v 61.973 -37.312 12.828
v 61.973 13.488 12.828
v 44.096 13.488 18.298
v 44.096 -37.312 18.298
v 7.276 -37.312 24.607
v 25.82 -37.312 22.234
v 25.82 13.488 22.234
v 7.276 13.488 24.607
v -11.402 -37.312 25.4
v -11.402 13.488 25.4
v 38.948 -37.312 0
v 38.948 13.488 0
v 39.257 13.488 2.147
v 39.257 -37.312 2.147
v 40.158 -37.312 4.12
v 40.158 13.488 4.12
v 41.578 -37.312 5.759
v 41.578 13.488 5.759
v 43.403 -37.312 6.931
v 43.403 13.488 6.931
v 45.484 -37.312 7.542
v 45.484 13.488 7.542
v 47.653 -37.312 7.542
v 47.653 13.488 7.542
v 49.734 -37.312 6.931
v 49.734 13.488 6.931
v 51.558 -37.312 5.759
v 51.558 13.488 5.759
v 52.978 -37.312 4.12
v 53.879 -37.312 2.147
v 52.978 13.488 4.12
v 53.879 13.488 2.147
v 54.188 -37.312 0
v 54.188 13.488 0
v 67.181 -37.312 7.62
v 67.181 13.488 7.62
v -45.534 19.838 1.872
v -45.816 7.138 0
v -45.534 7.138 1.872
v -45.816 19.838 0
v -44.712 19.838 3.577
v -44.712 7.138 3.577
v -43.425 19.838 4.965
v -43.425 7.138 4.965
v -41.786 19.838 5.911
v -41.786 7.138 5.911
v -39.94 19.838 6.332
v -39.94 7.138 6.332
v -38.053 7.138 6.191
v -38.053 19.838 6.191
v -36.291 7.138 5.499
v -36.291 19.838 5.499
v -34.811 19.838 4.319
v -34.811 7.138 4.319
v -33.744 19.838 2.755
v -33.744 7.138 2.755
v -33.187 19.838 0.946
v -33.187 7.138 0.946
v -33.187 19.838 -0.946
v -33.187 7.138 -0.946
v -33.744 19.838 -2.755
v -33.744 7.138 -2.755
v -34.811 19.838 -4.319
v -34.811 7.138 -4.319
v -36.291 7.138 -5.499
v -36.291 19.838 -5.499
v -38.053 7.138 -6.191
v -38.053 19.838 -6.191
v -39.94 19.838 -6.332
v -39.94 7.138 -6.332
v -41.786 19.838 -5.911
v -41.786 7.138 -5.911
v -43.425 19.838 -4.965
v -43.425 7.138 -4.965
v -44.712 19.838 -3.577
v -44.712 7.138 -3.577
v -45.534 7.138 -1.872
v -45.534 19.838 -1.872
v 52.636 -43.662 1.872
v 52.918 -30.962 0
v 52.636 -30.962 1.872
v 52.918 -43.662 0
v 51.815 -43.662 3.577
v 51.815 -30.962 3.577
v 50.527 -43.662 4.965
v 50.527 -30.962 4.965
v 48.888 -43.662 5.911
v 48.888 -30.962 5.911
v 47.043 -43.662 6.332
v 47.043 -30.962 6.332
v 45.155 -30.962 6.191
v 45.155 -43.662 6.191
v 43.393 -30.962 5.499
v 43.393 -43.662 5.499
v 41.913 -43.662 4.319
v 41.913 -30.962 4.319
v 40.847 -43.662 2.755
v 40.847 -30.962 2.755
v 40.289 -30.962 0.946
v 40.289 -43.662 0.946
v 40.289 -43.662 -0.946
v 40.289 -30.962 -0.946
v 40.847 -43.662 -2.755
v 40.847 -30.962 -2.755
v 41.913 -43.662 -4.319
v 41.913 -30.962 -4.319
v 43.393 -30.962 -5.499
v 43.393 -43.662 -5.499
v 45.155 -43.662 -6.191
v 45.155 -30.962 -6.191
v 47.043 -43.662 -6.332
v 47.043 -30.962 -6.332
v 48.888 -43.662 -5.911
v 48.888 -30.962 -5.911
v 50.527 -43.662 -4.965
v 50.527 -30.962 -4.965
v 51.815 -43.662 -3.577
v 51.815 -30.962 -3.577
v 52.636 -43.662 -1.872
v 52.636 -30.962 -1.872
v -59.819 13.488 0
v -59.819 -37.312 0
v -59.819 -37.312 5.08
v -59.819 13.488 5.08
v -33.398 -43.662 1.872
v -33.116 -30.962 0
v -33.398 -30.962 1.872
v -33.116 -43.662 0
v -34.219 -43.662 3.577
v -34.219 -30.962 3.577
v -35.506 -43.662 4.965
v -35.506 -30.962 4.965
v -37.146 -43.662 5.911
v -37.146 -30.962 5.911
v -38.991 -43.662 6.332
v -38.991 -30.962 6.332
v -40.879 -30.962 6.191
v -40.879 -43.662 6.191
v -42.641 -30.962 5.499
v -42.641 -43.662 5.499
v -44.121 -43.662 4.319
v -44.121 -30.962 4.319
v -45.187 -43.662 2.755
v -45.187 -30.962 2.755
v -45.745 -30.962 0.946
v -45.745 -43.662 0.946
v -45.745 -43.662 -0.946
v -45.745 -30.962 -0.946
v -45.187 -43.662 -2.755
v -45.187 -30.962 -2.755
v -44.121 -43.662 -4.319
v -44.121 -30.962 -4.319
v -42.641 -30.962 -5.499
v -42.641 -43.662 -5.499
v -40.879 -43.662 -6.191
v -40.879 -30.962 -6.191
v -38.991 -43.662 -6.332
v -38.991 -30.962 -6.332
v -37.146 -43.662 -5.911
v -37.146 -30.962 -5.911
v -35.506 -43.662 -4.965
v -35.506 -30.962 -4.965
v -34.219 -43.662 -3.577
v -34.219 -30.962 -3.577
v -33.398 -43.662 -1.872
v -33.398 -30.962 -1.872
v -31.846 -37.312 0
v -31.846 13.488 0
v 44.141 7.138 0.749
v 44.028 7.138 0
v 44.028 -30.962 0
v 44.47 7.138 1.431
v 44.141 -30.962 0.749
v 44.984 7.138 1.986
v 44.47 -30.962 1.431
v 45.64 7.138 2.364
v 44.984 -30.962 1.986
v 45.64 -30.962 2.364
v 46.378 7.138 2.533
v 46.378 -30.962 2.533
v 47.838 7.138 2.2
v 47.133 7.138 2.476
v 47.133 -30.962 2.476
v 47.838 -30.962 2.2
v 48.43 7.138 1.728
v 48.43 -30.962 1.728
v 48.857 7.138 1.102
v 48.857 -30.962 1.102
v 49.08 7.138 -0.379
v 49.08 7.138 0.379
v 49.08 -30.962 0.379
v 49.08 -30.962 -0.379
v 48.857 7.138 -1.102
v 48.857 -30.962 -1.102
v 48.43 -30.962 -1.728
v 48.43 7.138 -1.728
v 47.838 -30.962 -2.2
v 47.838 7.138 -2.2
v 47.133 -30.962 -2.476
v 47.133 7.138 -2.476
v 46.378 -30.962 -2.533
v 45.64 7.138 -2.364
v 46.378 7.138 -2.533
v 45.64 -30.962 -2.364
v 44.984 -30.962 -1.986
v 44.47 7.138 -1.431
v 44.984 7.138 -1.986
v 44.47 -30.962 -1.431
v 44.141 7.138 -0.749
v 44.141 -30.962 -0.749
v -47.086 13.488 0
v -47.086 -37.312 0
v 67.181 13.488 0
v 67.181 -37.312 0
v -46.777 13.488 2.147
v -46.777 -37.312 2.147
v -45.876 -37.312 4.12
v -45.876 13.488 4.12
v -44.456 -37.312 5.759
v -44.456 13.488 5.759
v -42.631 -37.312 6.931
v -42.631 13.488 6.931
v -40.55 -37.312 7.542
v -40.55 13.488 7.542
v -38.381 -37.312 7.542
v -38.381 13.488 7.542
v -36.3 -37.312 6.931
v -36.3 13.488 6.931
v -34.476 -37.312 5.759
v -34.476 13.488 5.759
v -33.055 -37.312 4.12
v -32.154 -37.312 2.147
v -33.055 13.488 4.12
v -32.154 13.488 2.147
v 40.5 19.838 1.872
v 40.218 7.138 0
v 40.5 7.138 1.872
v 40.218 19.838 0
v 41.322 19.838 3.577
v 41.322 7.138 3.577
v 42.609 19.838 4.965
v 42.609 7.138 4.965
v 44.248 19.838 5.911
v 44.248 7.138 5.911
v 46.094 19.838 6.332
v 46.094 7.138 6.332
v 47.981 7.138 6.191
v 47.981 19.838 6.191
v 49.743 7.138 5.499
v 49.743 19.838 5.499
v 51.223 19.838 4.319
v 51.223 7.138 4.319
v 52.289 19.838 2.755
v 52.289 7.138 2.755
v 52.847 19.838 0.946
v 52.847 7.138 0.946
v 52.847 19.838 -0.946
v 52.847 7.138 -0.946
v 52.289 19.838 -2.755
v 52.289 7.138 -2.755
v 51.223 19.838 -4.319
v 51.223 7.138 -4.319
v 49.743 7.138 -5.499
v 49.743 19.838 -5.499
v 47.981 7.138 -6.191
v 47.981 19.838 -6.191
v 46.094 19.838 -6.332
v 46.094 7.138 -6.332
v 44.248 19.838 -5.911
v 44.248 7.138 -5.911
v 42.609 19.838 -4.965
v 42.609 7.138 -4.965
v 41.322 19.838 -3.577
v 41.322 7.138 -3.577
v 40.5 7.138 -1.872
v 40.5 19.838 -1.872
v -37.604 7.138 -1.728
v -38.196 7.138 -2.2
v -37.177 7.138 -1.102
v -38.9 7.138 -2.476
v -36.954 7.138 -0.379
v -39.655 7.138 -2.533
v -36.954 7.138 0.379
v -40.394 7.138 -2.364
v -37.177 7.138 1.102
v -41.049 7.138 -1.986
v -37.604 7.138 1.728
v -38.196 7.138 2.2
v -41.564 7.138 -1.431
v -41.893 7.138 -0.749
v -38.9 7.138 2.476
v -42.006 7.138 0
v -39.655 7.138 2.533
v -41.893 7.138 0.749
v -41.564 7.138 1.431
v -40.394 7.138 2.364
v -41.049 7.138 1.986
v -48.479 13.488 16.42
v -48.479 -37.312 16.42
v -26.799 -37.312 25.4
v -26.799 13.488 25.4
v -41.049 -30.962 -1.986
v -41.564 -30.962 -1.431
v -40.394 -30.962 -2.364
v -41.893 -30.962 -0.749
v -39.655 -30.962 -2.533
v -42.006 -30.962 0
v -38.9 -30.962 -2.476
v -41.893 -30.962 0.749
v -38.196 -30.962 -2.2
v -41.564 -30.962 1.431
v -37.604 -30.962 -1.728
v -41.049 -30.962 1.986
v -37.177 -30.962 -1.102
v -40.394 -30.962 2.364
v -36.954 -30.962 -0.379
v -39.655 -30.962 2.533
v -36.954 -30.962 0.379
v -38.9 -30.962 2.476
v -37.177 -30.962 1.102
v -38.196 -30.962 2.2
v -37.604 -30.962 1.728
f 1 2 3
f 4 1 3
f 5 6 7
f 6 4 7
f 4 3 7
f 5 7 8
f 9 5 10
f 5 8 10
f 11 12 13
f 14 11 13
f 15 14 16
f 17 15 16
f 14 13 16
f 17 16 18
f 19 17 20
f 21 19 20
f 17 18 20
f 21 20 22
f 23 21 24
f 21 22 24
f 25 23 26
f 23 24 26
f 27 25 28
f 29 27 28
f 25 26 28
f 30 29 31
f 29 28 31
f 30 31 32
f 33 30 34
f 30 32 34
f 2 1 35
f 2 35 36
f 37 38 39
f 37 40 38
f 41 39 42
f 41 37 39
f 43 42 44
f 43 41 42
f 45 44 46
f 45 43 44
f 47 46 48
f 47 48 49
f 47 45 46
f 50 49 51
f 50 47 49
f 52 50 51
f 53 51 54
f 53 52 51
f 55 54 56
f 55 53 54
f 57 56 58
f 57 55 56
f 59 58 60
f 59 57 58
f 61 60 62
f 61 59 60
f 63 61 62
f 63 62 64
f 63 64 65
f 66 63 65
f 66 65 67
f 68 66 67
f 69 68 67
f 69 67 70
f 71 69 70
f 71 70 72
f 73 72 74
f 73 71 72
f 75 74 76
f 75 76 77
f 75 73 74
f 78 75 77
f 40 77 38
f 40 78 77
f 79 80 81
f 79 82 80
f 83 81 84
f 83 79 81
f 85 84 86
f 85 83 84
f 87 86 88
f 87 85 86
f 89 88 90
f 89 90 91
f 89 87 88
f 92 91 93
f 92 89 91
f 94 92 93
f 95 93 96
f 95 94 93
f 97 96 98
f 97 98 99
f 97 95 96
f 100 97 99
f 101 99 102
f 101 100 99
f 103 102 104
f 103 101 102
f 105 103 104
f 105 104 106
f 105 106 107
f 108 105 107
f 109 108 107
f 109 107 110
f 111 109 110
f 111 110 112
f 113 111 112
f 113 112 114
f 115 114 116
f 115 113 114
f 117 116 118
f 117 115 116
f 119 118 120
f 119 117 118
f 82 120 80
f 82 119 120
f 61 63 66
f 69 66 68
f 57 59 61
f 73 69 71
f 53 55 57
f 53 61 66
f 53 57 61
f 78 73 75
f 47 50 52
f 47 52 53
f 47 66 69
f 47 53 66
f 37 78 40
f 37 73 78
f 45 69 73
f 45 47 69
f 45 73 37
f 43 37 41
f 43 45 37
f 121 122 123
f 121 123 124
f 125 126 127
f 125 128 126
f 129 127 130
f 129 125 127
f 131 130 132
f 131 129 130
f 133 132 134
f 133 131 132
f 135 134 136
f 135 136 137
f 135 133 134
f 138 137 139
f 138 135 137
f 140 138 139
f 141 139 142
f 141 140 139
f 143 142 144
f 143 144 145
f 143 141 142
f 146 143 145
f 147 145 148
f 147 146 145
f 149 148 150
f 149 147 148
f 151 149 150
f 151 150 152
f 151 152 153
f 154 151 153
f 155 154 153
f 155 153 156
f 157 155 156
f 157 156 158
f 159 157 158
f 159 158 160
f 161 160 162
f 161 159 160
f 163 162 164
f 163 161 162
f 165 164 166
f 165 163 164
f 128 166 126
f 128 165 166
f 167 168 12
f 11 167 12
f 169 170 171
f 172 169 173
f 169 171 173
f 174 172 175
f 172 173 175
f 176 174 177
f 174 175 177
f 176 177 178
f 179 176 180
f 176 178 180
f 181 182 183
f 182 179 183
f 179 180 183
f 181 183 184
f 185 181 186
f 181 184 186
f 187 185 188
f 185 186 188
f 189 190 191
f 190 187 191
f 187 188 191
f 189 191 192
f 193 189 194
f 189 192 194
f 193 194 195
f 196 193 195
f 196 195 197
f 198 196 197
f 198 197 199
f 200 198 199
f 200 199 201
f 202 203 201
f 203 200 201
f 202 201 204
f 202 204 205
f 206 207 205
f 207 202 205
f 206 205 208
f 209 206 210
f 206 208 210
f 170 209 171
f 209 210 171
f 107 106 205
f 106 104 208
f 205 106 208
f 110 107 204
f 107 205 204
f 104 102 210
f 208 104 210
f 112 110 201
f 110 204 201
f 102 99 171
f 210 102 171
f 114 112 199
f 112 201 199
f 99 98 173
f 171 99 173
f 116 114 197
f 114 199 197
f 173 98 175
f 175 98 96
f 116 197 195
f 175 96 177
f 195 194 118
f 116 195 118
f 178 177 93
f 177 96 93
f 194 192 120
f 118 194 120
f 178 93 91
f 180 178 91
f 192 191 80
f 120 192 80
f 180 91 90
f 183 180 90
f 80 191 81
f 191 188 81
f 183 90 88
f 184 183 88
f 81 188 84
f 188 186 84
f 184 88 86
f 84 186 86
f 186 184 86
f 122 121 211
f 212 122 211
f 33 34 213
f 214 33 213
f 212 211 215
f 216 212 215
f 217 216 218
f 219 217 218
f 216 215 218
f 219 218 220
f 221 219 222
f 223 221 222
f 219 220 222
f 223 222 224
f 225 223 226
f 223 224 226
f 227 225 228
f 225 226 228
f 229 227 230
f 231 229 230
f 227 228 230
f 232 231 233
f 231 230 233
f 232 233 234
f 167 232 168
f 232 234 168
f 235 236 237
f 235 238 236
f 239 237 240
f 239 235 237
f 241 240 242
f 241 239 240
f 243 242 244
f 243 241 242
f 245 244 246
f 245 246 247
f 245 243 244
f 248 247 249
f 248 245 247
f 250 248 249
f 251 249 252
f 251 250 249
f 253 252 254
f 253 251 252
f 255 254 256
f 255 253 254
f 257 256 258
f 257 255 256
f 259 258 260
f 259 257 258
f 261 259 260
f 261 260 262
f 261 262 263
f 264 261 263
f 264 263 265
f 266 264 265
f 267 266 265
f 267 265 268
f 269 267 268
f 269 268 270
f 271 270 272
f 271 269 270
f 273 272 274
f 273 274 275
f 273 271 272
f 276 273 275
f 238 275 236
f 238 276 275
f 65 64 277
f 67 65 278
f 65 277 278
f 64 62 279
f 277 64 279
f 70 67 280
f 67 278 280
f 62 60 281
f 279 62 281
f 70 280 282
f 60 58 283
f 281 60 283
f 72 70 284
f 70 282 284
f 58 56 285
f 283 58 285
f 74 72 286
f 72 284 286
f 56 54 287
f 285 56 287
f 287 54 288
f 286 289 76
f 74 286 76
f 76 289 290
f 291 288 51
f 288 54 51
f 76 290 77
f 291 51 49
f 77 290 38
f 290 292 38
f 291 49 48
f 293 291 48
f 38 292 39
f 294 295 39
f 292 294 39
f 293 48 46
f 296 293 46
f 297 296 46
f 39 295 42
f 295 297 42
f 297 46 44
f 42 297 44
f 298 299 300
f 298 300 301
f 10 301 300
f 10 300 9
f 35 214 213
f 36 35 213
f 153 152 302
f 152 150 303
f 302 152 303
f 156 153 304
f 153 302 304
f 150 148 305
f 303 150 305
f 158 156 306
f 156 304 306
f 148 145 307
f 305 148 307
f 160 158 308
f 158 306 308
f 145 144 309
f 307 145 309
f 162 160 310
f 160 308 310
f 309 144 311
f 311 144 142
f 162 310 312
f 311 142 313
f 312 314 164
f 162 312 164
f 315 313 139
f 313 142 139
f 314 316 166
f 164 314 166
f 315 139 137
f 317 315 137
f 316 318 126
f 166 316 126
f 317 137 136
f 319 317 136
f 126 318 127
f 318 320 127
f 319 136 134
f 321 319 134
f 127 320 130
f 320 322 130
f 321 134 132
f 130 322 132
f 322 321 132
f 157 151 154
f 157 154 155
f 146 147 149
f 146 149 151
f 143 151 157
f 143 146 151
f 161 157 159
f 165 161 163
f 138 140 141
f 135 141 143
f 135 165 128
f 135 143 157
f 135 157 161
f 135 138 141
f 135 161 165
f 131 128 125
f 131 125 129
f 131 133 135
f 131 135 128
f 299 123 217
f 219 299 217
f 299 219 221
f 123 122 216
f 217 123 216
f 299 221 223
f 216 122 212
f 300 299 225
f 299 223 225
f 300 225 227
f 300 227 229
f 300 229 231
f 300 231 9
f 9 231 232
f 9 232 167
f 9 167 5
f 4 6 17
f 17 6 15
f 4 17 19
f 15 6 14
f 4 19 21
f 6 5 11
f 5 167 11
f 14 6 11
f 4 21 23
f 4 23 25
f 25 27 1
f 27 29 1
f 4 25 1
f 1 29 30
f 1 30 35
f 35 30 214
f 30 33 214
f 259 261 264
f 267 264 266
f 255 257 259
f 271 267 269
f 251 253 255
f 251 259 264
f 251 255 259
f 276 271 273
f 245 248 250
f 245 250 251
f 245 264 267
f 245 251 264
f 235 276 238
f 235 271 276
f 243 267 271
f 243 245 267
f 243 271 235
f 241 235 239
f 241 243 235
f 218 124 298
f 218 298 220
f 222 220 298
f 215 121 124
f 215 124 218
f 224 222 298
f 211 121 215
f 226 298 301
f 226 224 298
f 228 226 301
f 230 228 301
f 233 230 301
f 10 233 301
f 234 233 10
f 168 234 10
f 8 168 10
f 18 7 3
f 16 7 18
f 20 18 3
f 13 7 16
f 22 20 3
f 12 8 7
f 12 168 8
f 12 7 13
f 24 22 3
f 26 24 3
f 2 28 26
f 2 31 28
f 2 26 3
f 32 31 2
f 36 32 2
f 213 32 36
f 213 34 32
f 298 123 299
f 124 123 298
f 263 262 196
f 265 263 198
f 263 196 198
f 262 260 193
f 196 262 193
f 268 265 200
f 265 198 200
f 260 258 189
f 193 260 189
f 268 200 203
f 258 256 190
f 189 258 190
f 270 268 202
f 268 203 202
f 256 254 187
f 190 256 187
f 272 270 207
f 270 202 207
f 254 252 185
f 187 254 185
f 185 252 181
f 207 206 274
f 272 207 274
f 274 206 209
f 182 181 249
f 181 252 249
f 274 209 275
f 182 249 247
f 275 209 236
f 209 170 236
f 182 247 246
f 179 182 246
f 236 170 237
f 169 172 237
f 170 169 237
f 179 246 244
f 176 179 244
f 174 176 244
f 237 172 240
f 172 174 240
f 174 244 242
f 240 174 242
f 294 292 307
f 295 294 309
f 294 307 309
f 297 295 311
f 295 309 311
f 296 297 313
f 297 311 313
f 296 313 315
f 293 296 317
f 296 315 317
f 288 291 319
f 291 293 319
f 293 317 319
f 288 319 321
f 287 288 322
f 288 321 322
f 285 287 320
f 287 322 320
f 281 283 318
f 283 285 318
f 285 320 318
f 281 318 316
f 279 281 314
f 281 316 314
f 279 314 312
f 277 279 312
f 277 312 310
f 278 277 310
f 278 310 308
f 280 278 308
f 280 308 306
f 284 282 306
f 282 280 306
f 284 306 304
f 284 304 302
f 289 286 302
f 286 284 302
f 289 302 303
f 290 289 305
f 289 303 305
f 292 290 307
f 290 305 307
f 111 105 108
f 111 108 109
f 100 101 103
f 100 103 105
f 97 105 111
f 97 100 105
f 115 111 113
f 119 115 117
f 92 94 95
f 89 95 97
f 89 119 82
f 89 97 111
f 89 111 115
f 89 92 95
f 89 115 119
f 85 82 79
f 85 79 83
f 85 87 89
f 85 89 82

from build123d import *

# Parameters (mm, degrees)
F0_W        = 127
F0_H        = 50.8
F1_DEPTH    = 25.4
F2_SIZE     = 17.78
F3_SIZE     = 17.78
F4_T1_DEPTH = 265.915946003
F5_SIZE     = 20.32
F6_SIZE     = 12.7
F9_DEPTH    = 64.008
F10_DEPTH   = 80.264
F11_DEPTH   = 6.35
F12_R       = 2.54
F13_DEPTH   = 5.08
F15_DEPTH   = 108.712
F16_DEPTH   = 6.35
F17_R       = 2.54
F18_DEPTH   = 5.08
F19_R       = 6.35
F19_R_2     = 2.54
F20_DEPTH   = 6.35
F21_R       = 2.54
F22_DEPTH   = 5.08
F23_DEPTH   = 48.26


# Not quite as in the source:
# - a fillet or chamfer that OpenCascade refuses, or shapes differently, is made with other operations: its cross-section is extruded or revolved along the edge and cut away or added


with BuildPart() as f1:
    # F0 (on Top) → F1 (new body)
    with BuildSketch(Plane.XY):
        with Locations((3.6809762716, -11.9118855059)):
            Rectangle(F0_W, F0_H)
    extrude(amount=F1_DEPTH)

    # F2
    f2_edges = [f1.edges().sort_by_distance(p)[0] for p in [
        (67.180976, -11.911886, 25.4),
    ]]
    chamfer(f2_edges, length=F2_SIZE)

    # F3
    f3_edges = [f1.edges().sort_by_distance(p)[0] for p in [
        (49.400976, -11.911886, 25.4),
    ]]
    chamfer(f3_edges, length=F3_SIZE)

    # F4: fillet of radius 220.4055499979 on 1 edges, made by hand

    # F4_s2 → F4_t1 (cut)
    with BuildSketch(Plane.XZ.offset(-121.0460874956)):
        with BuildLine():
            ThreePointArc((61.9733348411, 12.8276414305), (25.8202104559, 22.2341739644), (-11.402212929, 25.4))
            Line((-11.402212929, 25.4), (31.6209762716, 25.4))
            Line((31.6209762716, 25.4), (61.9733348411, 12.8276414305))
        make_face()
    extrude(amount=F4_T1_DEPTH, mode=Mode.SUBTRACT)

    # F5
    f5_edges = [f1.edges().sort_by_distance(p)[0] for p in [
        (-59.819024, -11.911886, 25.4),
    ]]
    chamfer(f5_edges, length=F5_SIZE)

    # F6
    f6_edges = [f1.edges().sort_by_distance(p)[0] for p in [
        (-39.499024, -11.911886, 25.4),
    ]]
    chamfer(f6_edges, length=F6_SIZE)

    # F8 (on face) → F9 (cut)
    with BuildSketch(Plane(origin=(0, 13.4881144941, 0), x_dir=(-1, 0, 0), z_dir=(0, 1, 0))):
        with BuildLine():
            ThreePointArc((-52.9181478381, 0), (-46.5681478381, 6.35), (-40.2181478381, 0))
            Line((-40.2181478381, 0), (-38.9481478381, 0))
            ThreePointArc((-38.9481478381, 0), (-46.5681478381, 7.62), (-54.1881478381, 0))
            Line((-54.1881478381, 0), (-52.9181478381, 0))
        make_face()
        with BuildLine():
            Line((-52.9181478381, 0), (-40.2181478381, 0))
            ThreePointArc((-40.2181478381, 0), (-46.5681478381, 6.35), (-52.9181478381, 0))
        make_face()
        with BuildLine():
            ThreePointArc((45.8156211138, 0), (39.4656211138, 6.35), (33.1156211138, 0))
            Line((33.1156211138, 0), (45.8156211138, 0))
        make_face()
        with BuildLine():
            ThreePointArc((47.0856211138, 0), (39.4656211138, 7.62), (31.8456211138, 0))
            Line((31.8456211138, 0), (33.1156211138, 0))
            ThreePointArc((33.1156211138, 0), (39.4656211138, 6.35), (45.8156211138, 0))
            Line((45.8156211138, 0), (47.0856211138, 0))
        make_face()
    extrude(amount=-F9_DEPTH, mode=Mode.SUBTRACT)

    # F7 (on face) → F10 (cut)
    with BuildSketch(Plane.XZ.offset(37.3118855059)):
        with BuildLine():
            Line((-45.8156211138, 0), (-33.1156211138, 0))
            ThreePointArc((-33.1156211138, 0), (-39.4656211138, 6.35), (-45.8156211138, 0))
        make_face()
    extrude(amount=-F10_DEPTH, mode=Mode.SUBTRACT)

    # F7 (on face) → F15 (cut)
    with BuildSketch(Plane.XZ.offset(37.3118855059)):
        with BuildLine():
            Line((52.9181478381, 0), (40.2181478381, 0))
            ThreePointArc((40.2181478381, 0), (46.5681478381, -6.35), (52.9181478381, 0))
        make_face()
    extrude(amount=-F15_DEPTH, mode=Mode.SUBTRACT)


with BuildPart() as f11:
    # F7 (on face) → F11 (new body, symmetric)
    with BuildSketch(Plane.XZ.offset(37.3118855059)):
        with BuildLine():
            ThreePointArc((-45.8156211138, 0), (-39.4656211138, -6.35), (-33.1156211138, 0))
            Line((-33.1156211138, 0), (-45.8156211138, 0))
        make_face()
        with BuildLine():
            Line((-45.8156211138, 0), (-33.1156211138, 0))
            ThreePointArc((-33.1156211138, 0), (-39.4656211138, 6.35), (-45.8156211138, 0))
        make_face()
    extrude(amount=F11_DEPTH, both=True)

    # F12 (on face) → F13 (cut)
    with BuildSketch(Plane(origin=(0, -30.9618855059, 0), x_dir=(-1, 0, 0), z_dir=(0, 1, 0))):
        with Locations((39.4656211138, 0)):
            Circle(F12_R)
    extrude(amount=-F13_DEPTH, mode=Mode.SUBTRACT)

    # F23 (add, through all): a face of the model
    f23_faces = [f11.faces().sort_by_distance(p)[0] for p in [
        (-39.4656211138, -36.0418855059, 0),
    ]]


with BuildPart() as f16:
    # F7 (on face) → F16 (new body, symmetric)
    with BuildSketch(Plane.XZ.offset(37.3118855059)):
        with BuildLine():
            Line((52.9181478381, 0), (40.2181478381, 0))
            ThreePointArc((40.2181478381, 0), (46.5681478381, -6.35), (52.9181478381, 0))
        make_face()
        with BuildLine():
            ThreePointArc((52.9181478381, 0), (46.5681478381, 6.35), (40.2181478381, 0))
            Line((40.2181478381, 0), (52.9181478381, 0))
        make_face()
    extrude(amount=F16_DEPTH, both=True)

    # F17 (on face) → F18 (cut)
    with BuildSketch(Plane(origin=(0, -30.9618855059, 0), x_dir=(-1, 0, 0), z_dir=(0, 1, 0))):
        with Locations((-46.5681478381, 0)):
            Circle(F17_R)
    extrude(amount=-F18_DEPTH, mode=Mode.SUBTRACT)

    # F23#2 (add, through all): a face of the model
    f23_2_faces = [f16.faces().sort_by_distance(p)[0] for p in [
        (46.5681478381, -36.0418855059, 0),
    ]]


with BuildPart() as f20:
    # F19 (on face) → F20 (new body, symmetric)
    with BuildSketch(Plane(origin=(0, 13.4881144941, 0), x_dir=(-1, 0, 0), z_dir=(0, 1, 0))):
        with Locations((-46.5681478381, 0)):
            Circle(F19_R)
        with Locations((-46.5681478381, 0)):
            Circle(F19_R_2, mode=Mode.SUBTRACT)
        with Locations((-46.5681478381, 0)):
            Circle(F19_R_2)
    extrude(amount=F20_DEPTH, both=True)


with BuildPart() as f20b:
    # F19 (on face) → F20, piece 2 (new body, symmetric)
    with BuildSketch(Plane(origin=(0, 13.4881144941, 0), x_dir=(-1, 0, 0), z_dir=(0, 1, 0))):
        with Locations((39.4656211138, 0)):
            Circle(F19_R)
        with Locations((39.4656211138, 0)):
            Circle(F19_R_2, mode=Mode.SUBTRACT)
        with Locations((39.4656211138, 0)):
            Circle(F19_R_2)
    extrude(amount=F20_DEPTH, both=True)


with BuildPart() as f22_tool:
    # F21 (on face) → F22 (new body)
    with BuildSketch(Plane.XZ.offset(-7.1381144941)):
        with Locations((-39.4656211138, 0)):
            Circle(F21_R)
        with Locations((46.5681478381, 0)):
            Circle(F21_R)
    extrude(amount=-F22_DEPTH)


with BuildPart() as f20_1:
    add(f20.part)

    # F22: cut by f22_tool
    add(f22_tool.part, mode=Mode.SUBTRACT)


with BuildPart() as f20b_1:
    add(f20b.part)

    # F22: cut by f22_tool
    add(f22_tool.part, mode=Mode.SUBTRACT)


with BuildPart() as f11_1:
    add(f11.part)

    add(f20b_1.part)  # F23 merges F20b
    extrude(f23_faces, amount=F23_DEPTH)


with BuildPart() as f16_1:
    add(f16.part)

    add(f20_1.part)  # F23#2 merges F20
    extrude(f23_2_faces, amount=F23_DEPTH)


solid = Compound([f1.part, f11_1.part, f16_1.part])
